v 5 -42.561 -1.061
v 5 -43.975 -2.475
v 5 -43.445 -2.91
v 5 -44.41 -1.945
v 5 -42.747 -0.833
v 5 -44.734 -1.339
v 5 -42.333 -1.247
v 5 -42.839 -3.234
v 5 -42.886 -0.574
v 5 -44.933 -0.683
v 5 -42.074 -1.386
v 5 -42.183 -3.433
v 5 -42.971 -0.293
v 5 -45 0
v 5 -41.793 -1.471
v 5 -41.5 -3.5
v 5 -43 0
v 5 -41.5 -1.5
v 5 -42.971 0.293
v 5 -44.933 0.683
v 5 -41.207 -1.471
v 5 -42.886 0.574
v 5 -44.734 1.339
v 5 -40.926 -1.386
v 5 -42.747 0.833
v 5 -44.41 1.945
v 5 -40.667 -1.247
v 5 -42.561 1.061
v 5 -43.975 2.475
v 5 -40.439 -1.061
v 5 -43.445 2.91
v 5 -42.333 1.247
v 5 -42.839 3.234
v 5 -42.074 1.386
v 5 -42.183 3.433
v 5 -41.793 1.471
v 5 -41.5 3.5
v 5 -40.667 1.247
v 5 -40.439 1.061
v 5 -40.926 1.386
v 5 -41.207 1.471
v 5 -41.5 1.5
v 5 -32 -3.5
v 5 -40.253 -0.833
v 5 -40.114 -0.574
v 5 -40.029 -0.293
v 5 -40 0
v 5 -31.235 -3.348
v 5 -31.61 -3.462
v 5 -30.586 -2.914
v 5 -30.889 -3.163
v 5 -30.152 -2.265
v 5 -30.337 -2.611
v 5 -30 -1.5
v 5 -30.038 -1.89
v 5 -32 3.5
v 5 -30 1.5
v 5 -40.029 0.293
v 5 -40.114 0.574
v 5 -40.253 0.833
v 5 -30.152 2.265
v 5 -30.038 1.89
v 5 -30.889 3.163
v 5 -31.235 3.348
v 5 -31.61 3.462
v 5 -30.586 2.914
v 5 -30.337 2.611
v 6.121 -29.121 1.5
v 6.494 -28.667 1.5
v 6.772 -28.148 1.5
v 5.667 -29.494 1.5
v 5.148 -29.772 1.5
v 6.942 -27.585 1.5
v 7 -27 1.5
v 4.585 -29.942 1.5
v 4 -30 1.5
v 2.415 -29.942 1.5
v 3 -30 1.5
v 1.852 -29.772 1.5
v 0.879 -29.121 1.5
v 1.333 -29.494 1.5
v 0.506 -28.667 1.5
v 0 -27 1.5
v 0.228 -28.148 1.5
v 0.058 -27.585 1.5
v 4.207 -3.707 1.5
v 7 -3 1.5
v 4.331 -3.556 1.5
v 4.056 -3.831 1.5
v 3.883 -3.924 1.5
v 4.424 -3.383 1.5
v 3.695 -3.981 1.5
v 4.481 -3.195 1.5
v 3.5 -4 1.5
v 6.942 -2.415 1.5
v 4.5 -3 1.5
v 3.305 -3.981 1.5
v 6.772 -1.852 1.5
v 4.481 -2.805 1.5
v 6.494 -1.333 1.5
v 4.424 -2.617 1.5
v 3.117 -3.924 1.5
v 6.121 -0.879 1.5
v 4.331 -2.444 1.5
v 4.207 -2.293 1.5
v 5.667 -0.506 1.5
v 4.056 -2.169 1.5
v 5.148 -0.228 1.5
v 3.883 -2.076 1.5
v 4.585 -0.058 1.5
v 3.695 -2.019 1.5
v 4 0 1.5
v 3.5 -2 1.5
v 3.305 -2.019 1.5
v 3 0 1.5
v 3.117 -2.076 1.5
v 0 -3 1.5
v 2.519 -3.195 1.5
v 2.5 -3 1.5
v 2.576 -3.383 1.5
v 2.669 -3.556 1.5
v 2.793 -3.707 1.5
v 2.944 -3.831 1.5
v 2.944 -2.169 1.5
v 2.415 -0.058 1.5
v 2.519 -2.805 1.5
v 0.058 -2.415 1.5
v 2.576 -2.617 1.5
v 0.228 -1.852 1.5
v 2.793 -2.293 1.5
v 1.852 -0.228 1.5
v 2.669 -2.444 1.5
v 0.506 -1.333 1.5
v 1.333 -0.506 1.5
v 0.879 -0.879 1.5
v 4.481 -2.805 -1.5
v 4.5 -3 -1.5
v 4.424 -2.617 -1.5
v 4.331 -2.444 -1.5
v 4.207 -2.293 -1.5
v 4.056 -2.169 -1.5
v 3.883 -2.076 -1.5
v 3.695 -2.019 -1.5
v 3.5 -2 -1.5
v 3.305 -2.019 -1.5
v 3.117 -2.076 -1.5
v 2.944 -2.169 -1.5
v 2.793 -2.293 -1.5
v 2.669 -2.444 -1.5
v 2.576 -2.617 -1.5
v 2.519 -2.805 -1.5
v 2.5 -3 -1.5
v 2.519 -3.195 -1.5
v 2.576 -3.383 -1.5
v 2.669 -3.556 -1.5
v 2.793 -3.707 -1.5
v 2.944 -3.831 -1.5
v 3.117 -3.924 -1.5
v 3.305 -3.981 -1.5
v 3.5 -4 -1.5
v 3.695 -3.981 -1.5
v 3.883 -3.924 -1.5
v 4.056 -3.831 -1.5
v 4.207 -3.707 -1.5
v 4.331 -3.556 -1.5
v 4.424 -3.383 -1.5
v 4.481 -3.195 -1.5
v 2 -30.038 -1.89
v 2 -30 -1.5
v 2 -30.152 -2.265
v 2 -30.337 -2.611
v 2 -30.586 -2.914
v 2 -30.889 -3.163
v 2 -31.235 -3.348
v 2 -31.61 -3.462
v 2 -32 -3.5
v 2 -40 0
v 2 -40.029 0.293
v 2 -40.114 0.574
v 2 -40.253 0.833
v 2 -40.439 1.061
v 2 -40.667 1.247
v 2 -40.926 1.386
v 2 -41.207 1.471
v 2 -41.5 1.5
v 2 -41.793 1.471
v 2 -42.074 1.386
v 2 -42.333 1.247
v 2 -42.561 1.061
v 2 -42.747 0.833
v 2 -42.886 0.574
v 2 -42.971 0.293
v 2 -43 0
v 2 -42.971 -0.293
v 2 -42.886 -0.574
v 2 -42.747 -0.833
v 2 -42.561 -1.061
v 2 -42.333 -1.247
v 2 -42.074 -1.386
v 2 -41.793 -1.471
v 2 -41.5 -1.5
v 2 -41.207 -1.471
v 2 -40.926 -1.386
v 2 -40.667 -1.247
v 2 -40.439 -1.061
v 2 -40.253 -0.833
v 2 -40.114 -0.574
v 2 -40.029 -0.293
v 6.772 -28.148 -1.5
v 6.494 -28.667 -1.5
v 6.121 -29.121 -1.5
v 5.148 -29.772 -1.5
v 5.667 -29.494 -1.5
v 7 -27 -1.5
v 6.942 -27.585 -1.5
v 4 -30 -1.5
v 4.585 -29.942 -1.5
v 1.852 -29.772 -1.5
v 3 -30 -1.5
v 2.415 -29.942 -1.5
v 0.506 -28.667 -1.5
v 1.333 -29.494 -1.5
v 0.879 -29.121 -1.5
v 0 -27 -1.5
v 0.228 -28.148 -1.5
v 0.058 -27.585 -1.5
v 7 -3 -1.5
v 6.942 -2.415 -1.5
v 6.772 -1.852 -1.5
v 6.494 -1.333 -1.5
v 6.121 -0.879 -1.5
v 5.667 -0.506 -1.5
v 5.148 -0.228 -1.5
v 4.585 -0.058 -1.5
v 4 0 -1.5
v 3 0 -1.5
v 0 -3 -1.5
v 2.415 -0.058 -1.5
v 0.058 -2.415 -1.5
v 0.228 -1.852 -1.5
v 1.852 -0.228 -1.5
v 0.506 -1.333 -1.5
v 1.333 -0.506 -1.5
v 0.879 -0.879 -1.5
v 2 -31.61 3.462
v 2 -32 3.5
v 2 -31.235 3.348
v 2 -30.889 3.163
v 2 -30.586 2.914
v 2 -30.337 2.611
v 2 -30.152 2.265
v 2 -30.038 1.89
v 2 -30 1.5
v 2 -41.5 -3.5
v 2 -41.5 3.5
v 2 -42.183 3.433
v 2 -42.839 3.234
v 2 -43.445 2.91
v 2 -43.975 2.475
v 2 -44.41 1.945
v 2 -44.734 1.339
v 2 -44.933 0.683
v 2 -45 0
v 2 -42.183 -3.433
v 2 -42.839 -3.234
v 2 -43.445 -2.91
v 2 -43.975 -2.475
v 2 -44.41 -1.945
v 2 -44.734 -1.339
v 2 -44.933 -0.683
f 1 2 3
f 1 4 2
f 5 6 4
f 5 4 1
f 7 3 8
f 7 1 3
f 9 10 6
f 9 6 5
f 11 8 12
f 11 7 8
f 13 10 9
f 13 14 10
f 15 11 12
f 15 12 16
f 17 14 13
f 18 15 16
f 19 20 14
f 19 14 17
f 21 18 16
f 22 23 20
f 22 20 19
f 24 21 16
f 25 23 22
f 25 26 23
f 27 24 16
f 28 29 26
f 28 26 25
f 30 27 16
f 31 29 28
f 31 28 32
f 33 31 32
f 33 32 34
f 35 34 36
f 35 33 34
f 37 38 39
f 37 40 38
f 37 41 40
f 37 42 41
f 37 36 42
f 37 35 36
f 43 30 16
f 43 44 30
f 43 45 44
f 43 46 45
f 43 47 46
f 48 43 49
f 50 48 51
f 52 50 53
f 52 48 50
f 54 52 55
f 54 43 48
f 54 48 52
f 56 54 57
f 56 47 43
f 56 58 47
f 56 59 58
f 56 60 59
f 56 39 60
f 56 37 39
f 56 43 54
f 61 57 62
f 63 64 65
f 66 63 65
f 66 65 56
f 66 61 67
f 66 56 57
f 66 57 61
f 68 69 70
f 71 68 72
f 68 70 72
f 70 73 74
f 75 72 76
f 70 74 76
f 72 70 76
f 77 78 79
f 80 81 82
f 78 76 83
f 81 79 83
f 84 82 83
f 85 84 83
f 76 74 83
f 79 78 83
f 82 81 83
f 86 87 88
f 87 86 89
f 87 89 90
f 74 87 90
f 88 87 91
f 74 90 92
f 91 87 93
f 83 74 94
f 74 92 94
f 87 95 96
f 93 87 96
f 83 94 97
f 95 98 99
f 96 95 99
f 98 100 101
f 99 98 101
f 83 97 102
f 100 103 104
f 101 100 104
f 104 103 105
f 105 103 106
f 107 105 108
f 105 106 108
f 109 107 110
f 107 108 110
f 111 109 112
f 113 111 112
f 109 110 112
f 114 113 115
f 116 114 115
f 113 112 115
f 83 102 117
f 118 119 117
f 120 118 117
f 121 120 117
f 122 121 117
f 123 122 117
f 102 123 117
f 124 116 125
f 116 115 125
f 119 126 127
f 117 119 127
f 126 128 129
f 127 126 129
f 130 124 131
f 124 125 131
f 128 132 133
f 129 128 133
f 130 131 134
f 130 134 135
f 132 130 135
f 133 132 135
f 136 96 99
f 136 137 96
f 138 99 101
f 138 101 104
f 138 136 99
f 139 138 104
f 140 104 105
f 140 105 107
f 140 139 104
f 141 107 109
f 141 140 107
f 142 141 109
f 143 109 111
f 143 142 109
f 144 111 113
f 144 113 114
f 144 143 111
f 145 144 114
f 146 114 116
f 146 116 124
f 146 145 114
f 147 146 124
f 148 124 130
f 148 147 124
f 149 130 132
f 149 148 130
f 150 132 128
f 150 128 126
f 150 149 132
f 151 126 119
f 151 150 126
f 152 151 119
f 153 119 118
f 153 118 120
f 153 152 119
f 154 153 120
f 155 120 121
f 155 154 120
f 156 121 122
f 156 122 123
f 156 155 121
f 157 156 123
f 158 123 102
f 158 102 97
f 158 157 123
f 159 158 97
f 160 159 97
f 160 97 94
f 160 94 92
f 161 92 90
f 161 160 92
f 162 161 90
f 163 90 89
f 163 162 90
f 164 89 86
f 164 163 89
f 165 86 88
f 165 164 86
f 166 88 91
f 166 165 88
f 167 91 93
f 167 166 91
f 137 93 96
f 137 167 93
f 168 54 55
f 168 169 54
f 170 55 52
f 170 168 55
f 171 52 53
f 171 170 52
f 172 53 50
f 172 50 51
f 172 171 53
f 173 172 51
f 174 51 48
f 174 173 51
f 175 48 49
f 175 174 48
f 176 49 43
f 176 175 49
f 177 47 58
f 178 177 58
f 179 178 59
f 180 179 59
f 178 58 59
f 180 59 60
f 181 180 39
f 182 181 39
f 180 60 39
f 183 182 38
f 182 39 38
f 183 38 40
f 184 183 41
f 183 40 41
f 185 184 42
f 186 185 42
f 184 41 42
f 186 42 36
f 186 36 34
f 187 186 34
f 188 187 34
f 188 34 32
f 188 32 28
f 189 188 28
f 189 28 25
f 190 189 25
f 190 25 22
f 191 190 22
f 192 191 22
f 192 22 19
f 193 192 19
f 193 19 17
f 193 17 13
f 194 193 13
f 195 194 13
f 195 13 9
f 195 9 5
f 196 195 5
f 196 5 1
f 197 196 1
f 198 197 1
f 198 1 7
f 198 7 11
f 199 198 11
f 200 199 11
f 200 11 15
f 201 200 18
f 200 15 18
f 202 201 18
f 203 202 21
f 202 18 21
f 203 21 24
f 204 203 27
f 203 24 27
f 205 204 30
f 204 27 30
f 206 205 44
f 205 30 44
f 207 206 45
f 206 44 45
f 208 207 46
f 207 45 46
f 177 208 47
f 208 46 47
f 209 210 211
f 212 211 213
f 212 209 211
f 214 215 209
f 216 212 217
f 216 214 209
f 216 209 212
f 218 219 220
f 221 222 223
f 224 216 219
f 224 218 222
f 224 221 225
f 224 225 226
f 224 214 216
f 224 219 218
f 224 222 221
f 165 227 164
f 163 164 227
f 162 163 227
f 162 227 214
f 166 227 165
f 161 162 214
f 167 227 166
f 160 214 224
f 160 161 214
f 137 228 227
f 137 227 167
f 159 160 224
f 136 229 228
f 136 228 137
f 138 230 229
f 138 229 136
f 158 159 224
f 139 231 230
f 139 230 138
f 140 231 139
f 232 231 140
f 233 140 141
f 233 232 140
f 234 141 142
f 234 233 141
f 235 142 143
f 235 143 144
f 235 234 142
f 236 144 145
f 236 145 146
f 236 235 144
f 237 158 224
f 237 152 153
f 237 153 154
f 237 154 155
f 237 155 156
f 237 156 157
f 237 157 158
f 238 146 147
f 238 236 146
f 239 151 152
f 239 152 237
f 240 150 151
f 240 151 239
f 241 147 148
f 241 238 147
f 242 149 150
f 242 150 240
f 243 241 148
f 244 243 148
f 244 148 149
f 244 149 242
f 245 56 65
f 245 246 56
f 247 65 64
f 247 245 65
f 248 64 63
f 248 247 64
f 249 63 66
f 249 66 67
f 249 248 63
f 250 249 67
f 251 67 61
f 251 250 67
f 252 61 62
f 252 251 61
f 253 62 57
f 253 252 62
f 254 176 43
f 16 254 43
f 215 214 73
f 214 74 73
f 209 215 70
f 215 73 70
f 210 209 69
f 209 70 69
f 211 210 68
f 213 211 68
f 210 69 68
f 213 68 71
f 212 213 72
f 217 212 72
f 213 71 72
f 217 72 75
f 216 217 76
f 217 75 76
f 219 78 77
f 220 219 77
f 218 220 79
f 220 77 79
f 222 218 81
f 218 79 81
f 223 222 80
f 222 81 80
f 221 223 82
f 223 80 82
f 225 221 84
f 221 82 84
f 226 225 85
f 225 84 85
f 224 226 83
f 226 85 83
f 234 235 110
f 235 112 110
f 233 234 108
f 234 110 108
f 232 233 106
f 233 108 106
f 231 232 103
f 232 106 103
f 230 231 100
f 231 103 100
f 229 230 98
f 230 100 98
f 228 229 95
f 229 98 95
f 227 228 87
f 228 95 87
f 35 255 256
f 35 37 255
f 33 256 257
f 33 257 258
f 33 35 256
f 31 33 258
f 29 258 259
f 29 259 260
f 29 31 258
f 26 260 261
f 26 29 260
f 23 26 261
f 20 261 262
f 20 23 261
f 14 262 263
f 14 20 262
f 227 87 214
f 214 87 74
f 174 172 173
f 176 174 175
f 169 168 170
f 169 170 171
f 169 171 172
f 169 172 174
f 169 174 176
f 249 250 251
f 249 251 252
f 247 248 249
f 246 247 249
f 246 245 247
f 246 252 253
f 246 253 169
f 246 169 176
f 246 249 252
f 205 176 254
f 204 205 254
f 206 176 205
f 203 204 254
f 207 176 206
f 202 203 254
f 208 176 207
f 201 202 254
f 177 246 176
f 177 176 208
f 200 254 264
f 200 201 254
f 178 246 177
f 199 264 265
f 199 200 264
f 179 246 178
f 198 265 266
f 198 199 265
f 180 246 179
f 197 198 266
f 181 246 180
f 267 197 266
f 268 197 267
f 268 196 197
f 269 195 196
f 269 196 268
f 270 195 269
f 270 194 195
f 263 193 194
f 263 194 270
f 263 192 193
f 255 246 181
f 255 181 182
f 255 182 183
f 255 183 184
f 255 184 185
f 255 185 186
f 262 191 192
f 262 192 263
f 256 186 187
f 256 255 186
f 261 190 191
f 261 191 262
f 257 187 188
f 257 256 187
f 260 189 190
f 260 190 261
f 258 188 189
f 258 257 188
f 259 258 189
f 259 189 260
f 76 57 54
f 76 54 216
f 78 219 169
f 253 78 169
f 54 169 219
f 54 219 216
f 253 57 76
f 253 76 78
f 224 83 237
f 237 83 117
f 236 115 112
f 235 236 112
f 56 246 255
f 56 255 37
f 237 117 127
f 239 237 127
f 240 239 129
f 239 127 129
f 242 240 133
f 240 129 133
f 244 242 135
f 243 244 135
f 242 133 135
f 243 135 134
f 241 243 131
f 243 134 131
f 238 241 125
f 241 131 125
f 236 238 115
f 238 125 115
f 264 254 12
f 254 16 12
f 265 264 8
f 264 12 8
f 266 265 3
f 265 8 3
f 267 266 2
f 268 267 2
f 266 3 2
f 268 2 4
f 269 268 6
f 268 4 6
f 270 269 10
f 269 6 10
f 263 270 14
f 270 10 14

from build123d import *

# Parameters (mm, degrees)
SKETCH1_R           = 1
BOSS_EXTRUDE1_DEPTH = 1.5
BOSS_EXTRUDE2_DEPTH = 3.5
FILLET1_R           = 2
FILLET2_R           = 2
FILLET4_R           = 3.5
SKETCH2_R           = 1.5
CUT_EXTRUDE1_DEPTH  = 7


with BuildPart() as part:
    # Sketch1 → Boss-Extrude1 (new, symmetric)
    with BuildSketch(Plane.XY):
        with BuildLine():
            Line((3, 0), (4, 0))
            ThreePointArc((4, 0), (6.121320344, -0.878679656), (7, -3))
            Line((7, -3), (7, -27))
            ThreePointArc((7, -27), (6.121320344, -29.121320344), (4, -30))
            Line((4, -30), (3, -30))
            ThreePointArc((3, -30), (0.878679656, -29.121320344), (0, -27))
            Line((0, -27), (0, -3))
            ThreePointArc((0, -3), (0.878679656, -0.878679656), (3, 0))
        make_face()
        with Locations((3.5, -3)):
            Circle(SKETCH1_R, mode=Mode.SUBTRACT)
    extrude(amount=BOSS_EXTRUDE1_DEPTH, both=True)

    # Sketch1<3> → Boss-Extrude2 (add, symmetric)
    with BuildSketch(Plane.XY):
        Polygon((4, -30), (3, -30), (2, -30), (2, -45), (5, -45), (5, -30), align=None)
    extrude(amount=BOSS_EXTRUDE2_DEPTH, both=True)

    # Fillet1
    fillet1_edges = [part.edges().sort_by_distance(p)[0] for p in [
        (3.5, -30, 3.5),
    ]]
    fillet(fillet1_edges, radius=FILLET1_R - 0.0001)  # a hair under: the kernel refuses the full size

    # Fillet2
    fillet2_edges = [part.edges().sort_by_distance(p)[0] for p in [
        (3.5, -30, -3.5),
    ]]
    fillet(fillet2_edges, radius=FILLET2_R - 0.0001)  # a hair under: the kernel refuses the full size

    # Fillet4
    fillet4_edges = [part.edges().sort_by_distance(p)[0] for p in [
        (3.5, -45, 3.5),
        (3.5, -45, -3.5),
    ]]
    fillet(fillet4_edges, radius=FILLET4_R - 0.0001)  # a hair under: the kernel refuses the full size

    # Sketch2 → Cut-Extrude1 (cut)
    with BuildSketch(Plane(origin=(5, 0, 0), x_dir=(0, 0, -1), z_dir=(1, 0, 0))):
        with Locations(Location((0, -41.5, 0), (0, 0, 90))):
            Circle(SKETCH2_R)
    extrude(amount=-CUT_EXTRUDE1_DEPTH, mode=Mode.SUBTRACT)


solid = part.part
